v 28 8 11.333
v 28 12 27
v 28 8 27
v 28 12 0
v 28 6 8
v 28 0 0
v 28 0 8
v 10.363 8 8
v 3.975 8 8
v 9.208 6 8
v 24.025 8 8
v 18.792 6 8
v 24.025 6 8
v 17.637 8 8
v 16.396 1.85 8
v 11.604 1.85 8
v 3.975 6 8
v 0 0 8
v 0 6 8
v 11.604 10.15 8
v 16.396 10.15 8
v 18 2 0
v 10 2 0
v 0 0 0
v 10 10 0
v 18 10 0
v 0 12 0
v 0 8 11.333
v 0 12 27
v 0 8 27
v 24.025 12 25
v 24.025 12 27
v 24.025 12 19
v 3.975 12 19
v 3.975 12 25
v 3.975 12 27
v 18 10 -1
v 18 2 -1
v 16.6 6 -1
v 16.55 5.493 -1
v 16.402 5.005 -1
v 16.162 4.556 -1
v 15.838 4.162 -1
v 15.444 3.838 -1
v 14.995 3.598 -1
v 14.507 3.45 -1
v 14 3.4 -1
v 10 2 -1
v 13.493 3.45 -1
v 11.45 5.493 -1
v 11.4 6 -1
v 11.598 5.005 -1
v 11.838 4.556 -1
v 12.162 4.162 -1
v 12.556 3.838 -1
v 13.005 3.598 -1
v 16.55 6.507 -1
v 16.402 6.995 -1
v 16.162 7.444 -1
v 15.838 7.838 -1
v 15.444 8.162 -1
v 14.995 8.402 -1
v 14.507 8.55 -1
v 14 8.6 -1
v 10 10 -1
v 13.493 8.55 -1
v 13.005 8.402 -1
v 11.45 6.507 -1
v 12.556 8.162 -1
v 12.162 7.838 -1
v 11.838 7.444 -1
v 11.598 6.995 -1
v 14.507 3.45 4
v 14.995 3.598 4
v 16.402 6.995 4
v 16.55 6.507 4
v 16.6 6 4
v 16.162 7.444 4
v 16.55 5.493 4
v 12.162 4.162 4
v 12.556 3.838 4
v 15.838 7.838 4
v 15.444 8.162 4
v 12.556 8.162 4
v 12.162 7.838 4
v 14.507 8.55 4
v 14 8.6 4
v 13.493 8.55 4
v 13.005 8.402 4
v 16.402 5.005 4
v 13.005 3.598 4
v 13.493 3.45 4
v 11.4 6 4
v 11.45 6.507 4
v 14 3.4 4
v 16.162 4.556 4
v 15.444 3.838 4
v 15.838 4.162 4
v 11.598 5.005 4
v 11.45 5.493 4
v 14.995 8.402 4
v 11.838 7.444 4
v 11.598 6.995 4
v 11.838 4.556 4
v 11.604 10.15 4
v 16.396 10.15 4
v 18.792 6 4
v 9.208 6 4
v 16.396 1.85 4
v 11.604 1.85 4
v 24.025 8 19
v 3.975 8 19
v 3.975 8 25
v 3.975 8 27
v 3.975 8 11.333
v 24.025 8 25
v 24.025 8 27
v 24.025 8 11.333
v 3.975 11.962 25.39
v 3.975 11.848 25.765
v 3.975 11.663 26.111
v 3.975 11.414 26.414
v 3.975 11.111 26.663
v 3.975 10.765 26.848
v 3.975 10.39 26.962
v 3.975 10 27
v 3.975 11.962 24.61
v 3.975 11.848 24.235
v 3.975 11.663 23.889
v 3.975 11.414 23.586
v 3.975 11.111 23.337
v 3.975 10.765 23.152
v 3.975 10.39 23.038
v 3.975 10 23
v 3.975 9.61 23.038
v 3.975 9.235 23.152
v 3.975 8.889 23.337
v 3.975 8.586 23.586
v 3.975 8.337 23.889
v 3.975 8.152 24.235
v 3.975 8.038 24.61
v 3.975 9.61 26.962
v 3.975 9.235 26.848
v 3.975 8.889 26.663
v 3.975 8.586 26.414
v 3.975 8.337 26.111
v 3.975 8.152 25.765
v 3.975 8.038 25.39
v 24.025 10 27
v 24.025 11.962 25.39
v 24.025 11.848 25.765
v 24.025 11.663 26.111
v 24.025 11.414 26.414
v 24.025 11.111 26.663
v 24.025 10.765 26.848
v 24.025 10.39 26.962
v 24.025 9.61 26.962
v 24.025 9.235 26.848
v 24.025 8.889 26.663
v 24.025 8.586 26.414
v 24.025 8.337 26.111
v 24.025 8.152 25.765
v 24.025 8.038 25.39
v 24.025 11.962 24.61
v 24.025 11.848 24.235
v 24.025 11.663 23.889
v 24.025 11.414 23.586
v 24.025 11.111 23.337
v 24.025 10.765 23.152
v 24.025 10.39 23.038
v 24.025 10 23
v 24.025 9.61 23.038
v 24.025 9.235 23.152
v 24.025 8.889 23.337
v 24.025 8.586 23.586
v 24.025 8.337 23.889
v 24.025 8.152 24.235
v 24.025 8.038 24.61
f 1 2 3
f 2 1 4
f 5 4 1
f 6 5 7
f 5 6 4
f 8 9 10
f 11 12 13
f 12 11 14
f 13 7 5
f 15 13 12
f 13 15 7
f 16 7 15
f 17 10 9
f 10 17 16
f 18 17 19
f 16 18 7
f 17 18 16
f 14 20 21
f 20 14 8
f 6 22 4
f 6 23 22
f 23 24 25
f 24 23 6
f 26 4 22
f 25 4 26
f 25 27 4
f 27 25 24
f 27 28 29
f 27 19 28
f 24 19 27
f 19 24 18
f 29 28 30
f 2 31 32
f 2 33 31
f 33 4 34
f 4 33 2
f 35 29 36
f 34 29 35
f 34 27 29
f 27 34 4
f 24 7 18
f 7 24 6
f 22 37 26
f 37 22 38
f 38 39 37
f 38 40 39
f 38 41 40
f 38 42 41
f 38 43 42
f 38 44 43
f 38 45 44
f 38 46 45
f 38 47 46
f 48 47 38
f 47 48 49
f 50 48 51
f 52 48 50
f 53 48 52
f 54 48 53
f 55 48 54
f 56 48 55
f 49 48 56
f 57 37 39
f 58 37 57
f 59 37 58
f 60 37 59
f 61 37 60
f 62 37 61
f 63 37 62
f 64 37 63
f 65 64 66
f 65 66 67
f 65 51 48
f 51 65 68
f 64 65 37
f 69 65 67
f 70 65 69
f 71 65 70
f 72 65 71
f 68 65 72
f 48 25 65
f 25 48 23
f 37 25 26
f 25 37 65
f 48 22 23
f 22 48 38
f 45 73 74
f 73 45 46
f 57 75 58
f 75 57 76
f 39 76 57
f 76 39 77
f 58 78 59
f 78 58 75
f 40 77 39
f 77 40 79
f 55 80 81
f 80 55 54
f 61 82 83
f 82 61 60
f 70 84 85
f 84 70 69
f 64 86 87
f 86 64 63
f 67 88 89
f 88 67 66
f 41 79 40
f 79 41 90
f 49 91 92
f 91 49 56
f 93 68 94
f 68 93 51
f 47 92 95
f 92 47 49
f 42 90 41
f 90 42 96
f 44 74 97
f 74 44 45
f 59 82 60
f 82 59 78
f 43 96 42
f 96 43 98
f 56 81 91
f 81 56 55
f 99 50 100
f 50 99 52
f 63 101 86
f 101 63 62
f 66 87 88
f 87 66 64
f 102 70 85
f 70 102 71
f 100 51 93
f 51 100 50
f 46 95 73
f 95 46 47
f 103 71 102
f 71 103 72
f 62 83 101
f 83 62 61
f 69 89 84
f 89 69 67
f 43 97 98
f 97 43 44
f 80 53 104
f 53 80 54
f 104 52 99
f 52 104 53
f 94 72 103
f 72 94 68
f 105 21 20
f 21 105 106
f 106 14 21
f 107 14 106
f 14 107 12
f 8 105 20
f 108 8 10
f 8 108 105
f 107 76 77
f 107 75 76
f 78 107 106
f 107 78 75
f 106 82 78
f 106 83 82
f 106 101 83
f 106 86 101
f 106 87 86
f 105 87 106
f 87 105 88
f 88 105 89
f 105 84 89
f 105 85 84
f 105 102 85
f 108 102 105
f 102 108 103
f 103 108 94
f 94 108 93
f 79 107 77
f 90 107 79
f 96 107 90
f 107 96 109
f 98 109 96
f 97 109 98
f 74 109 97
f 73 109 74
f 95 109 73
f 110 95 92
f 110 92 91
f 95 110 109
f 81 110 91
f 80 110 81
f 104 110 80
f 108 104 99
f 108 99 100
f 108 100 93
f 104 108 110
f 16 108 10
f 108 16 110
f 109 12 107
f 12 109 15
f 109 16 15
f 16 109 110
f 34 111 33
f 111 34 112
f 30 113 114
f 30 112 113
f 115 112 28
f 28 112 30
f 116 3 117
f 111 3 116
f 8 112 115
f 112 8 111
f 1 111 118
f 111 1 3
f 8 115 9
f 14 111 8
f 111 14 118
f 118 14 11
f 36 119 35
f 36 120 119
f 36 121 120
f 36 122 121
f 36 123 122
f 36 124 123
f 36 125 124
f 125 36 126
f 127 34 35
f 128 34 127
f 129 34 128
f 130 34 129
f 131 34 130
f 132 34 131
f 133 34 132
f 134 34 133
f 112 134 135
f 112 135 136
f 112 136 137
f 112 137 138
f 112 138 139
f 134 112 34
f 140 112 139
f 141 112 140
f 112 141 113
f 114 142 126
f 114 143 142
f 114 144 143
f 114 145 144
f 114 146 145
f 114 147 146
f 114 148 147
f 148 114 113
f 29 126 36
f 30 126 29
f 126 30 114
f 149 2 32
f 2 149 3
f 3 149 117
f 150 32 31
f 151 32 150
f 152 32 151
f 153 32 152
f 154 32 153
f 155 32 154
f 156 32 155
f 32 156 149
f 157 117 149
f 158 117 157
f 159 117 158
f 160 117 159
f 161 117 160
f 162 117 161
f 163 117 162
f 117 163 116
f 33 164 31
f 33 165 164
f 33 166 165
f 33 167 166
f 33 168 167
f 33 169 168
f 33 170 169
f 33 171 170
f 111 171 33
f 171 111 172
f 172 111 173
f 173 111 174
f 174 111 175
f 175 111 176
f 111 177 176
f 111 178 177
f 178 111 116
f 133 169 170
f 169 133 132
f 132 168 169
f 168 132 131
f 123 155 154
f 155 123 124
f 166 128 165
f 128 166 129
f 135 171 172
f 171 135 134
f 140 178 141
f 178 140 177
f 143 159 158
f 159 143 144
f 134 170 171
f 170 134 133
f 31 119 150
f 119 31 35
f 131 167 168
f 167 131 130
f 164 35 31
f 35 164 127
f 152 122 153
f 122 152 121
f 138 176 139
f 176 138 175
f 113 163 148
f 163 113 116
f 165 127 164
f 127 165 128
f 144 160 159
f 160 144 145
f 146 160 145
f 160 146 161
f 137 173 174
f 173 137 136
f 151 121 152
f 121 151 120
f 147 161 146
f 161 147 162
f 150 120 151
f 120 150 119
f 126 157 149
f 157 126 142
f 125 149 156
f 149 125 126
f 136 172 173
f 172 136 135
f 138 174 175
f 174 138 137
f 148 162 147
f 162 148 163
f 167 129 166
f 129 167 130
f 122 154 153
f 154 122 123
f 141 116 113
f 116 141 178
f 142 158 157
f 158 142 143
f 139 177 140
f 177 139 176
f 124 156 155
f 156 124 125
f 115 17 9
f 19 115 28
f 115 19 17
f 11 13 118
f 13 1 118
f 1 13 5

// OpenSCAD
// file: ../lib/slot_mount.scad
// ============================================================
// Slot Mount Base Module
// ============================================================
// Reusable foundation for all shelf mounts
// Provides slot tab, mounting surface, M5 hole, and nut pocket

include <../params.scad>

module slot_mount_base() {
    // Horizontal base that sits on top of shelf
    // Need enough width for: slot tab + walls around nut pocket + channel side walls
    // Increased width provides more robust walls on sides of velcro channel
    base_width = 28;  // mm, provides 10mm wall on each side of slot tab
    base_depth = mount_body_d;
    base_height = mount_body_h;

    difference() {
        union() {
            // Main horizontal base body
            translate([0, 0, 0])
                cube([base_width, base_depth, base_height]);

            // Slot tab (extends downward from bottom of base)
            translate([(base_width - slot_tab_width) / 2,
                      (base_depth - slot_tab_width) / 2,
                      -slot_tab_depth])
                cube([slot_tab_width, slot_tab_width, slot_tab_depth]);
        }

        // M5 screw clearance hole (through entire base)
        translate([base_width / 2, base_depth / 2, -slot_tab_depth - 1])
            cylinder(h = base_height + slot_tab_depth + 2, d = m5_screw_d, $fn = 32);

        // Hex nut pocket (from top, side-loading style)
        // Using cos(30) to convert across-flats to circumradius
        translate([base_width / 2, base_depth / 2, base_height - m5_nut_h])
            cylinder(h = m5_nut_h + 1,
                    d = (m5_nut_w + nut_pocket_tol) / cos(30),
                    $fn = 6);
    }
}

// Test render
slot_mount_base();
// file: ../params.scad
// ============================================================
// Ham Radio Go Kit — OpenSCAD Parameters
// ============================================================

// ============================================================
// SHELF SLOT — MEASURED (configurable for other shelves)
// ============================================================
slot_width = 8.1;           // mm, slot opening width — MEASURED on Vevor shelf
slot_spacing = 5.0;         // mm, rail width between slots
shelf_thickness = 1.5;      // mm, shelf material thickness
slot_tab_width = 8.0;       // mm, tab width (fits in 8.1mm slot)
slot_tab_depth = 1.0;       // mm, tab depth - just prevents rotation, allows washer clearance
slot_tab_engage = 2.0;      // mm, minimum engagement depth for retention

// ============================================================
// M5 HARDWARE
// ============================================================
m5_screw_d = 5.2;           // mm, clearance hole diameter
m5_nut_w = 8.0;             // mm, hex nut width across flats
m5_nut_h = 4.0;             // mm, hex nut height
m5_washer_od = 10.0;        // mm, washer OD - verify clears slot

// ============================================================
// TOLERANCES
// ============================================================
fit_clearance = 0.2;        // mm, slot tab fit clearance
nut_pocket_tol = 0.3;       // mm, nut pocket oversize for capture

// ============================================================
// VELCRO STRAP MOUNTS
// ============================================================
velcro_width = 19.05;       // mm, 0.75" velcro - standardize all straps
velcro_channel_clearance = 1.0;  // mm, channel oversize
mount_body_w = 25.0;        // mm
mount_body_d = 25.0;        // mm
mount_body_h = 8.0;         // mm, sets max gear height that can be strapped

// ============================================================
// PINEBOOK PRO — measure closed unit with calipers
// ============================================================
pbp_w = 280.0;              // mm, width
pbp_d = 192.0;              // mm, depth
pbp_h = 12.0;               // mm, closed lid thickness — MEASURE
pbp_clearance = 0.5;        // mm, fit clearance inside captures

// L-mount (front, x2)
l_arm_thickness = 4.0;      // mm, horizontal arm thickness
l_arm_length = 15.0;        // mm, how far arm extends over laptop top

// Corner mount (rear, x2)
corner_wall_thickness = 4.0;  // mm
corner_wall_h = 20.0;         // mm, should be > pbp_h + corner_arm_thickness
corner_arm_length = 15.0;     // mm, top retention arm extends over laptop
corner_arm_thickness = 4.0;   // mm

// ============================================================
// MFJ-939 BRACKETS — measure on physical unit
// ============================================================
mfj939_chassis_w = 0.0;        // mm, outside width — MEASURE
mfj939_side_screw_d = 3.5;     // mm, #6-32 clearance hole — VERIFY
mfj939_side_screw_spacing = 0.0; // mm, fore/aft spacing between screw holes on side panel — MEASURE
mfj939_screw_height = 0.0;     // mm, screw centerline height above shelf surface — MEASURE

// Bracket geometry
bracket_foot_d = 25.0;         // mm, horizontal foot depth on shelf
bracket_foot_h = 8.0;          // mm, horizontal foot thickness
bracket_arm_thickness = 4.0;   // mm, vertical arm thickness
// main file
// ============================================================
// Velcro Strap Mount - MINIMAL Version
// ============================================================
// Compact L-shaped mount with minimal base footprint
// Takes up less shelf space while maintaining structural integrity

include <../params.scad>
use <../lib/slot_mount.scad>

module velcro_mount_minimal() {
    // Calculate dimensions
    base_width = 28;  // mm, same as regular - needed for nut pocket and slot tab
    base_depth = 12;  // mm, MINIMAL - just enough for stability
    base_height = mount_body_h;

    // Vertical arm dimensions
    arm_height = 20;  // mm, tall enough to support strapped equipment
    arm_thickness = 4;  // mm, thickness of vertical wall

    // Velcro channel dimensions
    channel_width = velcro_width + velcro_channel_clearance;
    channel_height = 6;  // mm, reduced for strength - just enough for velcro
    channel_top_radius = 2.5;  // mm, radius for rounded top edge

    union() {
        // Minimal horizontal base with slot tab and nut pocket
        // Custom minimal base instead of using slot_mount_base
        difference() {
            union() {
                // Main horizontal base body (minimal depth)
                translate([0, 0, 0])
                    cube([base_width, base_depth, base_height]);

                // Slot tab (extends downward from bottom of base)
                translate([(base_width - slot_tab_width) / 2,
                          (base_depth - slot_tab_width) / 2,
                          -slot_tab_depth])
                    cube([slot_tab_width, slot_tab_width, slot_tab_depth]);
            }

            // M5 screw clearance hole (through entire base)
            translate([base_width / 2, base_depth / 2, -slot_tab_depth - 1])
                cylinder(h = base_height + slot_tab_depth + 2, d = m5_screw_d, $fn = 32);

            // Hex nut pocket (from top, side-loading style)
            translate([base_width / 2, base_depth / 2, base_height - m5_nut_h])
                cylinder(h = m5_nut_h + 1,
                        d = (m5_nut_w + nut_pocket_tol) / cos(30),
                        $fn = 6);
        }

        // Vertical arm at back edge - built from separate pieces
        union() {
            // Calculate window position
            window_bottom_z = base_height + arm_height - channel_height - 3;
            side_wall_thickness = (base_width - channel_width) / 2;

            // Lower wall section (below window)
            translate([0, base_depth - arm_thickness, base_height])
                cube([base_width, arm_thickness, window_bottom_z - base_height]);

            // Left side wall (beside window) - extends up to top cylinder
            translate([0, base_depth - arm_thickness, window_bottom_z])
                cube([side_wall_thickness, arm_thickness, channel_height + arm_thickness / 2]);

            // Right side wall (beside window) - extends up to top cylinder
            translate([base_width - side_wall_thickness, base_depth - arm_thickness, window_bottom_z])
                cube([side_wall_thickness, arm_thickness, channel_height + arm_thickness / 2]);

            // Cylinder at top of window (forms rounded top of window opening and continues across wall)
            translate([
                0,
                base_depth - arm_thickness / 2,
                window_bottom_z + channel_height
            ])
                rotate([0, 90, 0])
                    cylinder(h = base_width, r = arm_thickness / 2, $fn = 32);
        }

        // Minimal gussets - smaller and positioned to fit minimal base
        gusset_depth = 6;  // mm, smaller - fits on minimal base
        gusset_height = 10;  // mm, smaller but still provides support
        gusset_thickness = (base_width - channel_width) / 2;

        // Left gusset
        translate([0, base_depth, base_height])
            rotate([90, 0, 90])
                linear_extrude(height = gusset_thickness)
                    polygon([
                        [0, 0],
                        [-gusset_depth, 0],
                        [0, gusset_height]
                    ]);

        // Right gusset
        translate([base_width - gusset_thickness, base_depth, base_height])
            rotate([90, 0, 90])
                linear_extrude(height = gusset_thickness)
                    polygon([
                        [0, 0],
                        [-gusset_depth, 0],
                        [0, gusset_height]
                    ]);
    }
}

// Render single mount for preview
velcro_mount_minimal();

// Uncomment to render mirrored pair for printing
// velcro_mount_minimal();
// translate([40, 0, 0])
//     mirror([1, 0, 0])
//         velcro_mount_minimal();
